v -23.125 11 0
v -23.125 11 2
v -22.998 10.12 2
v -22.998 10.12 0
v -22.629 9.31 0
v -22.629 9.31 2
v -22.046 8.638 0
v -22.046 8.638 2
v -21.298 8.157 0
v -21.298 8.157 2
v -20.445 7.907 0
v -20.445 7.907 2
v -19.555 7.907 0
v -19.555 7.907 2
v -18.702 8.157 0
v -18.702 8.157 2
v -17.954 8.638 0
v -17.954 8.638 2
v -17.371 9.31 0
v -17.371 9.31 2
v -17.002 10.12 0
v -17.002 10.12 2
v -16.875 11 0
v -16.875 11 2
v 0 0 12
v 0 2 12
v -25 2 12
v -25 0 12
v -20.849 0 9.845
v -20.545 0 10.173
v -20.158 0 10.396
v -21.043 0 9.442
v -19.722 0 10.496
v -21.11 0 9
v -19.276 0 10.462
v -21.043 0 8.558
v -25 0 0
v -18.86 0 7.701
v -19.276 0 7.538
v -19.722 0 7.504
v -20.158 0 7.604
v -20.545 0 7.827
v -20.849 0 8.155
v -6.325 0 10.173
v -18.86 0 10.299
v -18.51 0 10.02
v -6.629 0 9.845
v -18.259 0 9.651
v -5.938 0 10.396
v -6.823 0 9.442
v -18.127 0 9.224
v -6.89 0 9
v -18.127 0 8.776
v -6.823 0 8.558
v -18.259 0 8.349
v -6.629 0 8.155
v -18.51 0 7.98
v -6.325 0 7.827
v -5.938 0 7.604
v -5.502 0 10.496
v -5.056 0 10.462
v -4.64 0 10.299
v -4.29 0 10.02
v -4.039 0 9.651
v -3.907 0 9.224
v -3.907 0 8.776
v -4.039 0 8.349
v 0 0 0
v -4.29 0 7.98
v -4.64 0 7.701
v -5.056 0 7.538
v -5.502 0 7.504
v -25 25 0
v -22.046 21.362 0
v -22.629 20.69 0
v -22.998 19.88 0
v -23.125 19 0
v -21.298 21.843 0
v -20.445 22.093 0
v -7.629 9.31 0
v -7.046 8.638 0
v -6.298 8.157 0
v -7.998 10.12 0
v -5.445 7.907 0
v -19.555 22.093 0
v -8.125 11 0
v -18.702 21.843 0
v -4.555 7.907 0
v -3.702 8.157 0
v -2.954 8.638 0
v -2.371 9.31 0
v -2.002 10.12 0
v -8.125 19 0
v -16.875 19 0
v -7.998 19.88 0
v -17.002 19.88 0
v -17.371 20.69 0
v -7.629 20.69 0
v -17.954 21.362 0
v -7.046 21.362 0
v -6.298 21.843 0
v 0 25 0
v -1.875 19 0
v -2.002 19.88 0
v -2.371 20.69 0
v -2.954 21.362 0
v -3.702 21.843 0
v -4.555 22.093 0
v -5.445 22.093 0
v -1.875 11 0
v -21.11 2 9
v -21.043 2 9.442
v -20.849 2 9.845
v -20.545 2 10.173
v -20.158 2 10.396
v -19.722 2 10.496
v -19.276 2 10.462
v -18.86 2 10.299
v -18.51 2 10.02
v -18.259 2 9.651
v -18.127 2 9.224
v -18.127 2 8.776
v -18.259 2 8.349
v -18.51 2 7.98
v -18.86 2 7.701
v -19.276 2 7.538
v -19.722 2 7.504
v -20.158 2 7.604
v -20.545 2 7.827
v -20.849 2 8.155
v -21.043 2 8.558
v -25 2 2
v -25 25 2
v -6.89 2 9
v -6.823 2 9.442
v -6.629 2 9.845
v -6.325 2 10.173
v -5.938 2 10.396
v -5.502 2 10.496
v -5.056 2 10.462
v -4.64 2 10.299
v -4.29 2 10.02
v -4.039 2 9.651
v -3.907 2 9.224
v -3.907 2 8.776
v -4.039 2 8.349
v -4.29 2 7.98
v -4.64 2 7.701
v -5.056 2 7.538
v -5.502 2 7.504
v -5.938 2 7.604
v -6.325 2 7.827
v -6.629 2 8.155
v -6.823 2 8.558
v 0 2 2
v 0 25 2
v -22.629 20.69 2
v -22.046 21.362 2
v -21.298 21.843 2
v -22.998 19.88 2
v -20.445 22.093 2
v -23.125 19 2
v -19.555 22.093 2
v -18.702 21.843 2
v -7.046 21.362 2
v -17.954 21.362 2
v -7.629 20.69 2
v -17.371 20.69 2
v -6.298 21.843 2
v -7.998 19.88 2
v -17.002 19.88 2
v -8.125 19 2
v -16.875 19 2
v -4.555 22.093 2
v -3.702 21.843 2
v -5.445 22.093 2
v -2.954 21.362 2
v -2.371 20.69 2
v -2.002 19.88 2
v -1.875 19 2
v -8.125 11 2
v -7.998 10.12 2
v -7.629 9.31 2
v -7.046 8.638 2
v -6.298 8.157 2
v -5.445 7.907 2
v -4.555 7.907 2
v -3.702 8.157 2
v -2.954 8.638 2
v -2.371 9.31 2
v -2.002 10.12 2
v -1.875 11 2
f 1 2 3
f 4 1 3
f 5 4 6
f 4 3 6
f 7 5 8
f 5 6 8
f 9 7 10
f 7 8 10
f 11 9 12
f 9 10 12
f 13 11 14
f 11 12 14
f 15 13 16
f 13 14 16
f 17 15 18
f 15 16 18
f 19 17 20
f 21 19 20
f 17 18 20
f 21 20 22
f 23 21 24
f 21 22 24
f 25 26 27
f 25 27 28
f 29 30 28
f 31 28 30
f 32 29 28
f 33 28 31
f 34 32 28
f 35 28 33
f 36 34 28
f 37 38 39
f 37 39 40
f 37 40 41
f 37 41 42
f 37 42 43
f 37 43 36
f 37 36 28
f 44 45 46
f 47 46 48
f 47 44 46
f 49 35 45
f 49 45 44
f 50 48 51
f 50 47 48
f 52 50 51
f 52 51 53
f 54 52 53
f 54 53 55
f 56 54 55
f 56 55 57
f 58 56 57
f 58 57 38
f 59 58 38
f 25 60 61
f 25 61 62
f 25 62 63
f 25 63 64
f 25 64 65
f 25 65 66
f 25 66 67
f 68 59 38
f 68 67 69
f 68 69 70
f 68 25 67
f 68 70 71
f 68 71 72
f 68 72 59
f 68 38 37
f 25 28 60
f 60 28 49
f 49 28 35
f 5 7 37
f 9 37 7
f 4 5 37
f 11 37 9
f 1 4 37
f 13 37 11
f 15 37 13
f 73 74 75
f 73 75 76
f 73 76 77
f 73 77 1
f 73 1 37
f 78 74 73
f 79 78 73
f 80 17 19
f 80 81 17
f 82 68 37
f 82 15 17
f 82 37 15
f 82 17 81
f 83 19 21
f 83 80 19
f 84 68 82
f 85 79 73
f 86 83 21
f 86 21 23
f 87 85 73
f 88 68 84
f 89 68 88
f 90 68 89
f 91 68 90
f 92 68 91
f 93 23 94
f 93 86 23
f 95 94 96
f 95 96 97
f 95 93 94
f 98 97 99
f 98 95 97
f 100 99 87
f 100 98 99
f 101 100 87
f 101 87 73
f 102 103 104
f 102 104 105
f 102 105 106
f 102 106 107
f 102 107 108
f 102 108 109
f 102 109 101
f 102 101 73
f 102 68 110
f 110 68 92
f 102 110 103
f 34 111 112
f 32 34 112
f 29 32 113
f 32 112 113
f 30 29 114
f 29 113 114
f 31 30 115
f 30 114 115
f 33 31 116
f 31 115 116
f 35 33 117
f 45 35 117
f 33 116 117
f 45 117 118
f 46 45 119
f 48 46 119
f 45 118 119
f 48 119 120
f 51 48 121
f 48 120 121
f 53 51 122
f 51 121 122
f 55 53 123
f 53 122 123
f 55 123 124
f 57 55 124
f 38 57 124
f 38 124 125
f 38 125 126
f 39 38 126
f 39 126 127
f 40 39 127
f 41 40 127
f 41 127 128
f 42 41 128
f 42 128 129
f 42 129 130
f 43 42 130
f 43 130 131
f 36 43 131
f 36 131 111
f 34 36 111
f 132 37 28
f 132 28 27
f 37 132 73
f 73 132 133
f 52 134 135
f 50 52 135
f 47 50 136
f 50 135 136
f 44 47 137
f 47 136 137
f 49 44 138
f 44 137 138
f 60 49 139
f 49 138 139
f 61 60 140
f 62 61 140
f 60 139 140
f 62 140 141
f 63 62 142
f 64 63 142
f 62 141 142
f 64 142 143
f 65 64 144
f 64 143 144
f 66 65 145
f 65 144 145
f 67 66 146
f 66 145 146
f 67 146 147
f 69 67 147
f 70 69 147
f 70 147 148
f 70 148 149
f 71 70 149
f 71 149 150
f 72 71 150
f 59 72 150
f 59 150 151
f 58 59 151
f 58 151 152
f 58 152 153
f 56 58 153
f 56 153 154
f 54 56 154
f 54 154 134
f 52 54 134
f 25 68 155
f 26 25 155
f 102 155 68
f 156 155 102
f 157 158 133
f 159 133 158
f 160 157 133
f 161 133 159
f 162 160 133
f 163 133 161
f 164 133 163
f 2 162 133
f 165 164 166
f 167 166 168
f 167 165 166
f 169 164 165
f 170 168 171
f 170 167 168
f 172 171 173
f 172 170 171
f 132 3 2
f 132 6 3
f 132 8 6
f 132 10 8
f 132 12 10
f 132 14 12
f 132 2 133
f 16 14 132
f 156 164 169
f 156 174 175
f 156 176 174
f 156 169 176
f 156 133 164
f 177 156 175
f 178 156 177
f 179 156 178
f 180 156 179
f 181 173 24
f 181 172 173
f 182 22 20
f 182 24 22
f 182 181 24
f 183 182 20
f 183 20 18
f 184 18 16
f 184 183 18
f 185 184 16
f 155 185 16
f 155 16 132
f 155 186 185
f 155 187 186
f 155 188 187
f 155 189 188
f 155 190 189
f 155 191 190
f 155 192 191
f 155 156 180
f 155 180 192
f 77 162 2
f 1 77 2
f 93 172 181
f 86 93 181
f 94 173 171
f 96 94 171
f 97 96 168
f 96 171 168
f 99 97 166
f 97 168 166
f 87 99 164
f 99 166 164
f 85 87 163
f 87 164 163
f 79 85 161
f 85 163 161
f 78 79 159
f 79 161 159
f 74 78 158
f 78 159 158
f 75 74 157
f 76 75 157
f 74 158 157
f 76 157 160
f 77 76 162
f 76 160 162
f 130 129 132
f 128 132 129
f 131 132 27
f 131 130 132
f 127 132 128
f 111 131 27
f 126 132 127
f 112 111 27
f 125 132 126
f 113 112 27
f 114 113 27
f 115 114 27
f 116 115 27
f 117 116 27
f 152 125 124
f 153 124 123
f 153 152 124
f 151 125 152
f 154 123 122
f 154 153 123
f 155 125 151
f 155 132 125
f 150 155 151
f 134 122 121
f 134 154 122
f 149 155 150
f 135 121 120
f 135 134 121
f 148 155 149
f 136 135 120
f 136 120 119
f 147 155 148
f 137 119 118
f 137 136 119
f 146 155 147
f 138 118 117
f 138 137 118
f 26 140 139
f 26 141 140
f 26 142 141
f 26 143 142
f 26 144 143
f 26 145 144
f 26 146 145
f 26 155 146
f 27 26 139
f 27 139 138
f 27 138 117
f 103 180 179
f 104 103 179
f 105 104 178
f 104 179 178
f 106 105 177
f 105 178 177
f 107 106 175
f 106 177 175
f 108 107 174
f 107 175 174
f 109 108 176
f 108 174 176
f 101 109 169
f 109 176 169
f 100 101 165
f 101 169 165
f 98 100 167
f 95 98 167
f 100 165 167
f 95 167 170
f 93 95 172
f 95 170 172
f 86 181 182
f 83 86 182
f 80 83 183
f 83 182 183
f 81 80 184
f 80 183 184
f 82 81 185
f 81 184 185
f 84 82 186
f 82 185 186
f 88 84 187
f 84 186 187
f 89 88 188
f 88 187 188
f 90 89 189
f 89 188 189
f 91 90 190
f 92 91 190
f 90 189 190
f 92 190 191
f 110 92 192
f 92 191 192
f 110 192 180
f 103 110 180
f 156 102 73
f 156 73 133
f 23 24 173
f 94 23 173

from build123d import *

# Parameters (mm, degrees)
F1_DEPTH = 25
F2_R     = 1.5
F3_DEPTH = 25
F5_DEPTH = 25


with BuildPart() as f1:
    # F0 (on Right) → F1 (new body)
    with BuildSketch(Plane.YZ):
        Polygon((0, 12), (0, 0), (25, 0), (25, 2), (2, 2), (2, 12), align=None)
    extrude(amount=-F1_DEPTH)

    # F2 (on face) → F3 (cut)
    with BuildSketch(Plane(origin=(0, 2, 0), x_dir=(-1, 0, 0), z_dir=(0, 1, 0))):
        with Locations((5.39, 9)):
            Circle(F2_R)
        with Locations((19.61, 9)):
            Circle(F2_R)
    extrude(amount=-F3_DEPTH, mode=Mode.SUBTRACT)

    # F4 (on face) → F5 (cut)
    with BuildSketch(Plane.XY.offset(2)):
        with BuildLine():
            Line((-16.875, 11), (-16.875, 19))
            ThreePointArc((-16.875, 19), (-20, 22.125), (-23.125, 19))
            Line((-23.125, 19), (-23.125, 11))
            ThreePointArc((-23.125, 11), (-20, 7.875), (-16.875, 11))
        make_face()
        with BuildLine():
            Line((-1.875, 11), (-1.875, 19))
            ThreePointArc((-1.875, 19), (-5, 22.125), (-8.125, 19))
            Line((-8.125, 19), (-8.125, 11))
            ThreePointArc((-8.125, 11), (-5, 7.875), (-1.875, 11))
        make_face()
    extrude(amount=-F5_DEPTH, mode=Mode.SUBTRACT)


solid = f1.part
